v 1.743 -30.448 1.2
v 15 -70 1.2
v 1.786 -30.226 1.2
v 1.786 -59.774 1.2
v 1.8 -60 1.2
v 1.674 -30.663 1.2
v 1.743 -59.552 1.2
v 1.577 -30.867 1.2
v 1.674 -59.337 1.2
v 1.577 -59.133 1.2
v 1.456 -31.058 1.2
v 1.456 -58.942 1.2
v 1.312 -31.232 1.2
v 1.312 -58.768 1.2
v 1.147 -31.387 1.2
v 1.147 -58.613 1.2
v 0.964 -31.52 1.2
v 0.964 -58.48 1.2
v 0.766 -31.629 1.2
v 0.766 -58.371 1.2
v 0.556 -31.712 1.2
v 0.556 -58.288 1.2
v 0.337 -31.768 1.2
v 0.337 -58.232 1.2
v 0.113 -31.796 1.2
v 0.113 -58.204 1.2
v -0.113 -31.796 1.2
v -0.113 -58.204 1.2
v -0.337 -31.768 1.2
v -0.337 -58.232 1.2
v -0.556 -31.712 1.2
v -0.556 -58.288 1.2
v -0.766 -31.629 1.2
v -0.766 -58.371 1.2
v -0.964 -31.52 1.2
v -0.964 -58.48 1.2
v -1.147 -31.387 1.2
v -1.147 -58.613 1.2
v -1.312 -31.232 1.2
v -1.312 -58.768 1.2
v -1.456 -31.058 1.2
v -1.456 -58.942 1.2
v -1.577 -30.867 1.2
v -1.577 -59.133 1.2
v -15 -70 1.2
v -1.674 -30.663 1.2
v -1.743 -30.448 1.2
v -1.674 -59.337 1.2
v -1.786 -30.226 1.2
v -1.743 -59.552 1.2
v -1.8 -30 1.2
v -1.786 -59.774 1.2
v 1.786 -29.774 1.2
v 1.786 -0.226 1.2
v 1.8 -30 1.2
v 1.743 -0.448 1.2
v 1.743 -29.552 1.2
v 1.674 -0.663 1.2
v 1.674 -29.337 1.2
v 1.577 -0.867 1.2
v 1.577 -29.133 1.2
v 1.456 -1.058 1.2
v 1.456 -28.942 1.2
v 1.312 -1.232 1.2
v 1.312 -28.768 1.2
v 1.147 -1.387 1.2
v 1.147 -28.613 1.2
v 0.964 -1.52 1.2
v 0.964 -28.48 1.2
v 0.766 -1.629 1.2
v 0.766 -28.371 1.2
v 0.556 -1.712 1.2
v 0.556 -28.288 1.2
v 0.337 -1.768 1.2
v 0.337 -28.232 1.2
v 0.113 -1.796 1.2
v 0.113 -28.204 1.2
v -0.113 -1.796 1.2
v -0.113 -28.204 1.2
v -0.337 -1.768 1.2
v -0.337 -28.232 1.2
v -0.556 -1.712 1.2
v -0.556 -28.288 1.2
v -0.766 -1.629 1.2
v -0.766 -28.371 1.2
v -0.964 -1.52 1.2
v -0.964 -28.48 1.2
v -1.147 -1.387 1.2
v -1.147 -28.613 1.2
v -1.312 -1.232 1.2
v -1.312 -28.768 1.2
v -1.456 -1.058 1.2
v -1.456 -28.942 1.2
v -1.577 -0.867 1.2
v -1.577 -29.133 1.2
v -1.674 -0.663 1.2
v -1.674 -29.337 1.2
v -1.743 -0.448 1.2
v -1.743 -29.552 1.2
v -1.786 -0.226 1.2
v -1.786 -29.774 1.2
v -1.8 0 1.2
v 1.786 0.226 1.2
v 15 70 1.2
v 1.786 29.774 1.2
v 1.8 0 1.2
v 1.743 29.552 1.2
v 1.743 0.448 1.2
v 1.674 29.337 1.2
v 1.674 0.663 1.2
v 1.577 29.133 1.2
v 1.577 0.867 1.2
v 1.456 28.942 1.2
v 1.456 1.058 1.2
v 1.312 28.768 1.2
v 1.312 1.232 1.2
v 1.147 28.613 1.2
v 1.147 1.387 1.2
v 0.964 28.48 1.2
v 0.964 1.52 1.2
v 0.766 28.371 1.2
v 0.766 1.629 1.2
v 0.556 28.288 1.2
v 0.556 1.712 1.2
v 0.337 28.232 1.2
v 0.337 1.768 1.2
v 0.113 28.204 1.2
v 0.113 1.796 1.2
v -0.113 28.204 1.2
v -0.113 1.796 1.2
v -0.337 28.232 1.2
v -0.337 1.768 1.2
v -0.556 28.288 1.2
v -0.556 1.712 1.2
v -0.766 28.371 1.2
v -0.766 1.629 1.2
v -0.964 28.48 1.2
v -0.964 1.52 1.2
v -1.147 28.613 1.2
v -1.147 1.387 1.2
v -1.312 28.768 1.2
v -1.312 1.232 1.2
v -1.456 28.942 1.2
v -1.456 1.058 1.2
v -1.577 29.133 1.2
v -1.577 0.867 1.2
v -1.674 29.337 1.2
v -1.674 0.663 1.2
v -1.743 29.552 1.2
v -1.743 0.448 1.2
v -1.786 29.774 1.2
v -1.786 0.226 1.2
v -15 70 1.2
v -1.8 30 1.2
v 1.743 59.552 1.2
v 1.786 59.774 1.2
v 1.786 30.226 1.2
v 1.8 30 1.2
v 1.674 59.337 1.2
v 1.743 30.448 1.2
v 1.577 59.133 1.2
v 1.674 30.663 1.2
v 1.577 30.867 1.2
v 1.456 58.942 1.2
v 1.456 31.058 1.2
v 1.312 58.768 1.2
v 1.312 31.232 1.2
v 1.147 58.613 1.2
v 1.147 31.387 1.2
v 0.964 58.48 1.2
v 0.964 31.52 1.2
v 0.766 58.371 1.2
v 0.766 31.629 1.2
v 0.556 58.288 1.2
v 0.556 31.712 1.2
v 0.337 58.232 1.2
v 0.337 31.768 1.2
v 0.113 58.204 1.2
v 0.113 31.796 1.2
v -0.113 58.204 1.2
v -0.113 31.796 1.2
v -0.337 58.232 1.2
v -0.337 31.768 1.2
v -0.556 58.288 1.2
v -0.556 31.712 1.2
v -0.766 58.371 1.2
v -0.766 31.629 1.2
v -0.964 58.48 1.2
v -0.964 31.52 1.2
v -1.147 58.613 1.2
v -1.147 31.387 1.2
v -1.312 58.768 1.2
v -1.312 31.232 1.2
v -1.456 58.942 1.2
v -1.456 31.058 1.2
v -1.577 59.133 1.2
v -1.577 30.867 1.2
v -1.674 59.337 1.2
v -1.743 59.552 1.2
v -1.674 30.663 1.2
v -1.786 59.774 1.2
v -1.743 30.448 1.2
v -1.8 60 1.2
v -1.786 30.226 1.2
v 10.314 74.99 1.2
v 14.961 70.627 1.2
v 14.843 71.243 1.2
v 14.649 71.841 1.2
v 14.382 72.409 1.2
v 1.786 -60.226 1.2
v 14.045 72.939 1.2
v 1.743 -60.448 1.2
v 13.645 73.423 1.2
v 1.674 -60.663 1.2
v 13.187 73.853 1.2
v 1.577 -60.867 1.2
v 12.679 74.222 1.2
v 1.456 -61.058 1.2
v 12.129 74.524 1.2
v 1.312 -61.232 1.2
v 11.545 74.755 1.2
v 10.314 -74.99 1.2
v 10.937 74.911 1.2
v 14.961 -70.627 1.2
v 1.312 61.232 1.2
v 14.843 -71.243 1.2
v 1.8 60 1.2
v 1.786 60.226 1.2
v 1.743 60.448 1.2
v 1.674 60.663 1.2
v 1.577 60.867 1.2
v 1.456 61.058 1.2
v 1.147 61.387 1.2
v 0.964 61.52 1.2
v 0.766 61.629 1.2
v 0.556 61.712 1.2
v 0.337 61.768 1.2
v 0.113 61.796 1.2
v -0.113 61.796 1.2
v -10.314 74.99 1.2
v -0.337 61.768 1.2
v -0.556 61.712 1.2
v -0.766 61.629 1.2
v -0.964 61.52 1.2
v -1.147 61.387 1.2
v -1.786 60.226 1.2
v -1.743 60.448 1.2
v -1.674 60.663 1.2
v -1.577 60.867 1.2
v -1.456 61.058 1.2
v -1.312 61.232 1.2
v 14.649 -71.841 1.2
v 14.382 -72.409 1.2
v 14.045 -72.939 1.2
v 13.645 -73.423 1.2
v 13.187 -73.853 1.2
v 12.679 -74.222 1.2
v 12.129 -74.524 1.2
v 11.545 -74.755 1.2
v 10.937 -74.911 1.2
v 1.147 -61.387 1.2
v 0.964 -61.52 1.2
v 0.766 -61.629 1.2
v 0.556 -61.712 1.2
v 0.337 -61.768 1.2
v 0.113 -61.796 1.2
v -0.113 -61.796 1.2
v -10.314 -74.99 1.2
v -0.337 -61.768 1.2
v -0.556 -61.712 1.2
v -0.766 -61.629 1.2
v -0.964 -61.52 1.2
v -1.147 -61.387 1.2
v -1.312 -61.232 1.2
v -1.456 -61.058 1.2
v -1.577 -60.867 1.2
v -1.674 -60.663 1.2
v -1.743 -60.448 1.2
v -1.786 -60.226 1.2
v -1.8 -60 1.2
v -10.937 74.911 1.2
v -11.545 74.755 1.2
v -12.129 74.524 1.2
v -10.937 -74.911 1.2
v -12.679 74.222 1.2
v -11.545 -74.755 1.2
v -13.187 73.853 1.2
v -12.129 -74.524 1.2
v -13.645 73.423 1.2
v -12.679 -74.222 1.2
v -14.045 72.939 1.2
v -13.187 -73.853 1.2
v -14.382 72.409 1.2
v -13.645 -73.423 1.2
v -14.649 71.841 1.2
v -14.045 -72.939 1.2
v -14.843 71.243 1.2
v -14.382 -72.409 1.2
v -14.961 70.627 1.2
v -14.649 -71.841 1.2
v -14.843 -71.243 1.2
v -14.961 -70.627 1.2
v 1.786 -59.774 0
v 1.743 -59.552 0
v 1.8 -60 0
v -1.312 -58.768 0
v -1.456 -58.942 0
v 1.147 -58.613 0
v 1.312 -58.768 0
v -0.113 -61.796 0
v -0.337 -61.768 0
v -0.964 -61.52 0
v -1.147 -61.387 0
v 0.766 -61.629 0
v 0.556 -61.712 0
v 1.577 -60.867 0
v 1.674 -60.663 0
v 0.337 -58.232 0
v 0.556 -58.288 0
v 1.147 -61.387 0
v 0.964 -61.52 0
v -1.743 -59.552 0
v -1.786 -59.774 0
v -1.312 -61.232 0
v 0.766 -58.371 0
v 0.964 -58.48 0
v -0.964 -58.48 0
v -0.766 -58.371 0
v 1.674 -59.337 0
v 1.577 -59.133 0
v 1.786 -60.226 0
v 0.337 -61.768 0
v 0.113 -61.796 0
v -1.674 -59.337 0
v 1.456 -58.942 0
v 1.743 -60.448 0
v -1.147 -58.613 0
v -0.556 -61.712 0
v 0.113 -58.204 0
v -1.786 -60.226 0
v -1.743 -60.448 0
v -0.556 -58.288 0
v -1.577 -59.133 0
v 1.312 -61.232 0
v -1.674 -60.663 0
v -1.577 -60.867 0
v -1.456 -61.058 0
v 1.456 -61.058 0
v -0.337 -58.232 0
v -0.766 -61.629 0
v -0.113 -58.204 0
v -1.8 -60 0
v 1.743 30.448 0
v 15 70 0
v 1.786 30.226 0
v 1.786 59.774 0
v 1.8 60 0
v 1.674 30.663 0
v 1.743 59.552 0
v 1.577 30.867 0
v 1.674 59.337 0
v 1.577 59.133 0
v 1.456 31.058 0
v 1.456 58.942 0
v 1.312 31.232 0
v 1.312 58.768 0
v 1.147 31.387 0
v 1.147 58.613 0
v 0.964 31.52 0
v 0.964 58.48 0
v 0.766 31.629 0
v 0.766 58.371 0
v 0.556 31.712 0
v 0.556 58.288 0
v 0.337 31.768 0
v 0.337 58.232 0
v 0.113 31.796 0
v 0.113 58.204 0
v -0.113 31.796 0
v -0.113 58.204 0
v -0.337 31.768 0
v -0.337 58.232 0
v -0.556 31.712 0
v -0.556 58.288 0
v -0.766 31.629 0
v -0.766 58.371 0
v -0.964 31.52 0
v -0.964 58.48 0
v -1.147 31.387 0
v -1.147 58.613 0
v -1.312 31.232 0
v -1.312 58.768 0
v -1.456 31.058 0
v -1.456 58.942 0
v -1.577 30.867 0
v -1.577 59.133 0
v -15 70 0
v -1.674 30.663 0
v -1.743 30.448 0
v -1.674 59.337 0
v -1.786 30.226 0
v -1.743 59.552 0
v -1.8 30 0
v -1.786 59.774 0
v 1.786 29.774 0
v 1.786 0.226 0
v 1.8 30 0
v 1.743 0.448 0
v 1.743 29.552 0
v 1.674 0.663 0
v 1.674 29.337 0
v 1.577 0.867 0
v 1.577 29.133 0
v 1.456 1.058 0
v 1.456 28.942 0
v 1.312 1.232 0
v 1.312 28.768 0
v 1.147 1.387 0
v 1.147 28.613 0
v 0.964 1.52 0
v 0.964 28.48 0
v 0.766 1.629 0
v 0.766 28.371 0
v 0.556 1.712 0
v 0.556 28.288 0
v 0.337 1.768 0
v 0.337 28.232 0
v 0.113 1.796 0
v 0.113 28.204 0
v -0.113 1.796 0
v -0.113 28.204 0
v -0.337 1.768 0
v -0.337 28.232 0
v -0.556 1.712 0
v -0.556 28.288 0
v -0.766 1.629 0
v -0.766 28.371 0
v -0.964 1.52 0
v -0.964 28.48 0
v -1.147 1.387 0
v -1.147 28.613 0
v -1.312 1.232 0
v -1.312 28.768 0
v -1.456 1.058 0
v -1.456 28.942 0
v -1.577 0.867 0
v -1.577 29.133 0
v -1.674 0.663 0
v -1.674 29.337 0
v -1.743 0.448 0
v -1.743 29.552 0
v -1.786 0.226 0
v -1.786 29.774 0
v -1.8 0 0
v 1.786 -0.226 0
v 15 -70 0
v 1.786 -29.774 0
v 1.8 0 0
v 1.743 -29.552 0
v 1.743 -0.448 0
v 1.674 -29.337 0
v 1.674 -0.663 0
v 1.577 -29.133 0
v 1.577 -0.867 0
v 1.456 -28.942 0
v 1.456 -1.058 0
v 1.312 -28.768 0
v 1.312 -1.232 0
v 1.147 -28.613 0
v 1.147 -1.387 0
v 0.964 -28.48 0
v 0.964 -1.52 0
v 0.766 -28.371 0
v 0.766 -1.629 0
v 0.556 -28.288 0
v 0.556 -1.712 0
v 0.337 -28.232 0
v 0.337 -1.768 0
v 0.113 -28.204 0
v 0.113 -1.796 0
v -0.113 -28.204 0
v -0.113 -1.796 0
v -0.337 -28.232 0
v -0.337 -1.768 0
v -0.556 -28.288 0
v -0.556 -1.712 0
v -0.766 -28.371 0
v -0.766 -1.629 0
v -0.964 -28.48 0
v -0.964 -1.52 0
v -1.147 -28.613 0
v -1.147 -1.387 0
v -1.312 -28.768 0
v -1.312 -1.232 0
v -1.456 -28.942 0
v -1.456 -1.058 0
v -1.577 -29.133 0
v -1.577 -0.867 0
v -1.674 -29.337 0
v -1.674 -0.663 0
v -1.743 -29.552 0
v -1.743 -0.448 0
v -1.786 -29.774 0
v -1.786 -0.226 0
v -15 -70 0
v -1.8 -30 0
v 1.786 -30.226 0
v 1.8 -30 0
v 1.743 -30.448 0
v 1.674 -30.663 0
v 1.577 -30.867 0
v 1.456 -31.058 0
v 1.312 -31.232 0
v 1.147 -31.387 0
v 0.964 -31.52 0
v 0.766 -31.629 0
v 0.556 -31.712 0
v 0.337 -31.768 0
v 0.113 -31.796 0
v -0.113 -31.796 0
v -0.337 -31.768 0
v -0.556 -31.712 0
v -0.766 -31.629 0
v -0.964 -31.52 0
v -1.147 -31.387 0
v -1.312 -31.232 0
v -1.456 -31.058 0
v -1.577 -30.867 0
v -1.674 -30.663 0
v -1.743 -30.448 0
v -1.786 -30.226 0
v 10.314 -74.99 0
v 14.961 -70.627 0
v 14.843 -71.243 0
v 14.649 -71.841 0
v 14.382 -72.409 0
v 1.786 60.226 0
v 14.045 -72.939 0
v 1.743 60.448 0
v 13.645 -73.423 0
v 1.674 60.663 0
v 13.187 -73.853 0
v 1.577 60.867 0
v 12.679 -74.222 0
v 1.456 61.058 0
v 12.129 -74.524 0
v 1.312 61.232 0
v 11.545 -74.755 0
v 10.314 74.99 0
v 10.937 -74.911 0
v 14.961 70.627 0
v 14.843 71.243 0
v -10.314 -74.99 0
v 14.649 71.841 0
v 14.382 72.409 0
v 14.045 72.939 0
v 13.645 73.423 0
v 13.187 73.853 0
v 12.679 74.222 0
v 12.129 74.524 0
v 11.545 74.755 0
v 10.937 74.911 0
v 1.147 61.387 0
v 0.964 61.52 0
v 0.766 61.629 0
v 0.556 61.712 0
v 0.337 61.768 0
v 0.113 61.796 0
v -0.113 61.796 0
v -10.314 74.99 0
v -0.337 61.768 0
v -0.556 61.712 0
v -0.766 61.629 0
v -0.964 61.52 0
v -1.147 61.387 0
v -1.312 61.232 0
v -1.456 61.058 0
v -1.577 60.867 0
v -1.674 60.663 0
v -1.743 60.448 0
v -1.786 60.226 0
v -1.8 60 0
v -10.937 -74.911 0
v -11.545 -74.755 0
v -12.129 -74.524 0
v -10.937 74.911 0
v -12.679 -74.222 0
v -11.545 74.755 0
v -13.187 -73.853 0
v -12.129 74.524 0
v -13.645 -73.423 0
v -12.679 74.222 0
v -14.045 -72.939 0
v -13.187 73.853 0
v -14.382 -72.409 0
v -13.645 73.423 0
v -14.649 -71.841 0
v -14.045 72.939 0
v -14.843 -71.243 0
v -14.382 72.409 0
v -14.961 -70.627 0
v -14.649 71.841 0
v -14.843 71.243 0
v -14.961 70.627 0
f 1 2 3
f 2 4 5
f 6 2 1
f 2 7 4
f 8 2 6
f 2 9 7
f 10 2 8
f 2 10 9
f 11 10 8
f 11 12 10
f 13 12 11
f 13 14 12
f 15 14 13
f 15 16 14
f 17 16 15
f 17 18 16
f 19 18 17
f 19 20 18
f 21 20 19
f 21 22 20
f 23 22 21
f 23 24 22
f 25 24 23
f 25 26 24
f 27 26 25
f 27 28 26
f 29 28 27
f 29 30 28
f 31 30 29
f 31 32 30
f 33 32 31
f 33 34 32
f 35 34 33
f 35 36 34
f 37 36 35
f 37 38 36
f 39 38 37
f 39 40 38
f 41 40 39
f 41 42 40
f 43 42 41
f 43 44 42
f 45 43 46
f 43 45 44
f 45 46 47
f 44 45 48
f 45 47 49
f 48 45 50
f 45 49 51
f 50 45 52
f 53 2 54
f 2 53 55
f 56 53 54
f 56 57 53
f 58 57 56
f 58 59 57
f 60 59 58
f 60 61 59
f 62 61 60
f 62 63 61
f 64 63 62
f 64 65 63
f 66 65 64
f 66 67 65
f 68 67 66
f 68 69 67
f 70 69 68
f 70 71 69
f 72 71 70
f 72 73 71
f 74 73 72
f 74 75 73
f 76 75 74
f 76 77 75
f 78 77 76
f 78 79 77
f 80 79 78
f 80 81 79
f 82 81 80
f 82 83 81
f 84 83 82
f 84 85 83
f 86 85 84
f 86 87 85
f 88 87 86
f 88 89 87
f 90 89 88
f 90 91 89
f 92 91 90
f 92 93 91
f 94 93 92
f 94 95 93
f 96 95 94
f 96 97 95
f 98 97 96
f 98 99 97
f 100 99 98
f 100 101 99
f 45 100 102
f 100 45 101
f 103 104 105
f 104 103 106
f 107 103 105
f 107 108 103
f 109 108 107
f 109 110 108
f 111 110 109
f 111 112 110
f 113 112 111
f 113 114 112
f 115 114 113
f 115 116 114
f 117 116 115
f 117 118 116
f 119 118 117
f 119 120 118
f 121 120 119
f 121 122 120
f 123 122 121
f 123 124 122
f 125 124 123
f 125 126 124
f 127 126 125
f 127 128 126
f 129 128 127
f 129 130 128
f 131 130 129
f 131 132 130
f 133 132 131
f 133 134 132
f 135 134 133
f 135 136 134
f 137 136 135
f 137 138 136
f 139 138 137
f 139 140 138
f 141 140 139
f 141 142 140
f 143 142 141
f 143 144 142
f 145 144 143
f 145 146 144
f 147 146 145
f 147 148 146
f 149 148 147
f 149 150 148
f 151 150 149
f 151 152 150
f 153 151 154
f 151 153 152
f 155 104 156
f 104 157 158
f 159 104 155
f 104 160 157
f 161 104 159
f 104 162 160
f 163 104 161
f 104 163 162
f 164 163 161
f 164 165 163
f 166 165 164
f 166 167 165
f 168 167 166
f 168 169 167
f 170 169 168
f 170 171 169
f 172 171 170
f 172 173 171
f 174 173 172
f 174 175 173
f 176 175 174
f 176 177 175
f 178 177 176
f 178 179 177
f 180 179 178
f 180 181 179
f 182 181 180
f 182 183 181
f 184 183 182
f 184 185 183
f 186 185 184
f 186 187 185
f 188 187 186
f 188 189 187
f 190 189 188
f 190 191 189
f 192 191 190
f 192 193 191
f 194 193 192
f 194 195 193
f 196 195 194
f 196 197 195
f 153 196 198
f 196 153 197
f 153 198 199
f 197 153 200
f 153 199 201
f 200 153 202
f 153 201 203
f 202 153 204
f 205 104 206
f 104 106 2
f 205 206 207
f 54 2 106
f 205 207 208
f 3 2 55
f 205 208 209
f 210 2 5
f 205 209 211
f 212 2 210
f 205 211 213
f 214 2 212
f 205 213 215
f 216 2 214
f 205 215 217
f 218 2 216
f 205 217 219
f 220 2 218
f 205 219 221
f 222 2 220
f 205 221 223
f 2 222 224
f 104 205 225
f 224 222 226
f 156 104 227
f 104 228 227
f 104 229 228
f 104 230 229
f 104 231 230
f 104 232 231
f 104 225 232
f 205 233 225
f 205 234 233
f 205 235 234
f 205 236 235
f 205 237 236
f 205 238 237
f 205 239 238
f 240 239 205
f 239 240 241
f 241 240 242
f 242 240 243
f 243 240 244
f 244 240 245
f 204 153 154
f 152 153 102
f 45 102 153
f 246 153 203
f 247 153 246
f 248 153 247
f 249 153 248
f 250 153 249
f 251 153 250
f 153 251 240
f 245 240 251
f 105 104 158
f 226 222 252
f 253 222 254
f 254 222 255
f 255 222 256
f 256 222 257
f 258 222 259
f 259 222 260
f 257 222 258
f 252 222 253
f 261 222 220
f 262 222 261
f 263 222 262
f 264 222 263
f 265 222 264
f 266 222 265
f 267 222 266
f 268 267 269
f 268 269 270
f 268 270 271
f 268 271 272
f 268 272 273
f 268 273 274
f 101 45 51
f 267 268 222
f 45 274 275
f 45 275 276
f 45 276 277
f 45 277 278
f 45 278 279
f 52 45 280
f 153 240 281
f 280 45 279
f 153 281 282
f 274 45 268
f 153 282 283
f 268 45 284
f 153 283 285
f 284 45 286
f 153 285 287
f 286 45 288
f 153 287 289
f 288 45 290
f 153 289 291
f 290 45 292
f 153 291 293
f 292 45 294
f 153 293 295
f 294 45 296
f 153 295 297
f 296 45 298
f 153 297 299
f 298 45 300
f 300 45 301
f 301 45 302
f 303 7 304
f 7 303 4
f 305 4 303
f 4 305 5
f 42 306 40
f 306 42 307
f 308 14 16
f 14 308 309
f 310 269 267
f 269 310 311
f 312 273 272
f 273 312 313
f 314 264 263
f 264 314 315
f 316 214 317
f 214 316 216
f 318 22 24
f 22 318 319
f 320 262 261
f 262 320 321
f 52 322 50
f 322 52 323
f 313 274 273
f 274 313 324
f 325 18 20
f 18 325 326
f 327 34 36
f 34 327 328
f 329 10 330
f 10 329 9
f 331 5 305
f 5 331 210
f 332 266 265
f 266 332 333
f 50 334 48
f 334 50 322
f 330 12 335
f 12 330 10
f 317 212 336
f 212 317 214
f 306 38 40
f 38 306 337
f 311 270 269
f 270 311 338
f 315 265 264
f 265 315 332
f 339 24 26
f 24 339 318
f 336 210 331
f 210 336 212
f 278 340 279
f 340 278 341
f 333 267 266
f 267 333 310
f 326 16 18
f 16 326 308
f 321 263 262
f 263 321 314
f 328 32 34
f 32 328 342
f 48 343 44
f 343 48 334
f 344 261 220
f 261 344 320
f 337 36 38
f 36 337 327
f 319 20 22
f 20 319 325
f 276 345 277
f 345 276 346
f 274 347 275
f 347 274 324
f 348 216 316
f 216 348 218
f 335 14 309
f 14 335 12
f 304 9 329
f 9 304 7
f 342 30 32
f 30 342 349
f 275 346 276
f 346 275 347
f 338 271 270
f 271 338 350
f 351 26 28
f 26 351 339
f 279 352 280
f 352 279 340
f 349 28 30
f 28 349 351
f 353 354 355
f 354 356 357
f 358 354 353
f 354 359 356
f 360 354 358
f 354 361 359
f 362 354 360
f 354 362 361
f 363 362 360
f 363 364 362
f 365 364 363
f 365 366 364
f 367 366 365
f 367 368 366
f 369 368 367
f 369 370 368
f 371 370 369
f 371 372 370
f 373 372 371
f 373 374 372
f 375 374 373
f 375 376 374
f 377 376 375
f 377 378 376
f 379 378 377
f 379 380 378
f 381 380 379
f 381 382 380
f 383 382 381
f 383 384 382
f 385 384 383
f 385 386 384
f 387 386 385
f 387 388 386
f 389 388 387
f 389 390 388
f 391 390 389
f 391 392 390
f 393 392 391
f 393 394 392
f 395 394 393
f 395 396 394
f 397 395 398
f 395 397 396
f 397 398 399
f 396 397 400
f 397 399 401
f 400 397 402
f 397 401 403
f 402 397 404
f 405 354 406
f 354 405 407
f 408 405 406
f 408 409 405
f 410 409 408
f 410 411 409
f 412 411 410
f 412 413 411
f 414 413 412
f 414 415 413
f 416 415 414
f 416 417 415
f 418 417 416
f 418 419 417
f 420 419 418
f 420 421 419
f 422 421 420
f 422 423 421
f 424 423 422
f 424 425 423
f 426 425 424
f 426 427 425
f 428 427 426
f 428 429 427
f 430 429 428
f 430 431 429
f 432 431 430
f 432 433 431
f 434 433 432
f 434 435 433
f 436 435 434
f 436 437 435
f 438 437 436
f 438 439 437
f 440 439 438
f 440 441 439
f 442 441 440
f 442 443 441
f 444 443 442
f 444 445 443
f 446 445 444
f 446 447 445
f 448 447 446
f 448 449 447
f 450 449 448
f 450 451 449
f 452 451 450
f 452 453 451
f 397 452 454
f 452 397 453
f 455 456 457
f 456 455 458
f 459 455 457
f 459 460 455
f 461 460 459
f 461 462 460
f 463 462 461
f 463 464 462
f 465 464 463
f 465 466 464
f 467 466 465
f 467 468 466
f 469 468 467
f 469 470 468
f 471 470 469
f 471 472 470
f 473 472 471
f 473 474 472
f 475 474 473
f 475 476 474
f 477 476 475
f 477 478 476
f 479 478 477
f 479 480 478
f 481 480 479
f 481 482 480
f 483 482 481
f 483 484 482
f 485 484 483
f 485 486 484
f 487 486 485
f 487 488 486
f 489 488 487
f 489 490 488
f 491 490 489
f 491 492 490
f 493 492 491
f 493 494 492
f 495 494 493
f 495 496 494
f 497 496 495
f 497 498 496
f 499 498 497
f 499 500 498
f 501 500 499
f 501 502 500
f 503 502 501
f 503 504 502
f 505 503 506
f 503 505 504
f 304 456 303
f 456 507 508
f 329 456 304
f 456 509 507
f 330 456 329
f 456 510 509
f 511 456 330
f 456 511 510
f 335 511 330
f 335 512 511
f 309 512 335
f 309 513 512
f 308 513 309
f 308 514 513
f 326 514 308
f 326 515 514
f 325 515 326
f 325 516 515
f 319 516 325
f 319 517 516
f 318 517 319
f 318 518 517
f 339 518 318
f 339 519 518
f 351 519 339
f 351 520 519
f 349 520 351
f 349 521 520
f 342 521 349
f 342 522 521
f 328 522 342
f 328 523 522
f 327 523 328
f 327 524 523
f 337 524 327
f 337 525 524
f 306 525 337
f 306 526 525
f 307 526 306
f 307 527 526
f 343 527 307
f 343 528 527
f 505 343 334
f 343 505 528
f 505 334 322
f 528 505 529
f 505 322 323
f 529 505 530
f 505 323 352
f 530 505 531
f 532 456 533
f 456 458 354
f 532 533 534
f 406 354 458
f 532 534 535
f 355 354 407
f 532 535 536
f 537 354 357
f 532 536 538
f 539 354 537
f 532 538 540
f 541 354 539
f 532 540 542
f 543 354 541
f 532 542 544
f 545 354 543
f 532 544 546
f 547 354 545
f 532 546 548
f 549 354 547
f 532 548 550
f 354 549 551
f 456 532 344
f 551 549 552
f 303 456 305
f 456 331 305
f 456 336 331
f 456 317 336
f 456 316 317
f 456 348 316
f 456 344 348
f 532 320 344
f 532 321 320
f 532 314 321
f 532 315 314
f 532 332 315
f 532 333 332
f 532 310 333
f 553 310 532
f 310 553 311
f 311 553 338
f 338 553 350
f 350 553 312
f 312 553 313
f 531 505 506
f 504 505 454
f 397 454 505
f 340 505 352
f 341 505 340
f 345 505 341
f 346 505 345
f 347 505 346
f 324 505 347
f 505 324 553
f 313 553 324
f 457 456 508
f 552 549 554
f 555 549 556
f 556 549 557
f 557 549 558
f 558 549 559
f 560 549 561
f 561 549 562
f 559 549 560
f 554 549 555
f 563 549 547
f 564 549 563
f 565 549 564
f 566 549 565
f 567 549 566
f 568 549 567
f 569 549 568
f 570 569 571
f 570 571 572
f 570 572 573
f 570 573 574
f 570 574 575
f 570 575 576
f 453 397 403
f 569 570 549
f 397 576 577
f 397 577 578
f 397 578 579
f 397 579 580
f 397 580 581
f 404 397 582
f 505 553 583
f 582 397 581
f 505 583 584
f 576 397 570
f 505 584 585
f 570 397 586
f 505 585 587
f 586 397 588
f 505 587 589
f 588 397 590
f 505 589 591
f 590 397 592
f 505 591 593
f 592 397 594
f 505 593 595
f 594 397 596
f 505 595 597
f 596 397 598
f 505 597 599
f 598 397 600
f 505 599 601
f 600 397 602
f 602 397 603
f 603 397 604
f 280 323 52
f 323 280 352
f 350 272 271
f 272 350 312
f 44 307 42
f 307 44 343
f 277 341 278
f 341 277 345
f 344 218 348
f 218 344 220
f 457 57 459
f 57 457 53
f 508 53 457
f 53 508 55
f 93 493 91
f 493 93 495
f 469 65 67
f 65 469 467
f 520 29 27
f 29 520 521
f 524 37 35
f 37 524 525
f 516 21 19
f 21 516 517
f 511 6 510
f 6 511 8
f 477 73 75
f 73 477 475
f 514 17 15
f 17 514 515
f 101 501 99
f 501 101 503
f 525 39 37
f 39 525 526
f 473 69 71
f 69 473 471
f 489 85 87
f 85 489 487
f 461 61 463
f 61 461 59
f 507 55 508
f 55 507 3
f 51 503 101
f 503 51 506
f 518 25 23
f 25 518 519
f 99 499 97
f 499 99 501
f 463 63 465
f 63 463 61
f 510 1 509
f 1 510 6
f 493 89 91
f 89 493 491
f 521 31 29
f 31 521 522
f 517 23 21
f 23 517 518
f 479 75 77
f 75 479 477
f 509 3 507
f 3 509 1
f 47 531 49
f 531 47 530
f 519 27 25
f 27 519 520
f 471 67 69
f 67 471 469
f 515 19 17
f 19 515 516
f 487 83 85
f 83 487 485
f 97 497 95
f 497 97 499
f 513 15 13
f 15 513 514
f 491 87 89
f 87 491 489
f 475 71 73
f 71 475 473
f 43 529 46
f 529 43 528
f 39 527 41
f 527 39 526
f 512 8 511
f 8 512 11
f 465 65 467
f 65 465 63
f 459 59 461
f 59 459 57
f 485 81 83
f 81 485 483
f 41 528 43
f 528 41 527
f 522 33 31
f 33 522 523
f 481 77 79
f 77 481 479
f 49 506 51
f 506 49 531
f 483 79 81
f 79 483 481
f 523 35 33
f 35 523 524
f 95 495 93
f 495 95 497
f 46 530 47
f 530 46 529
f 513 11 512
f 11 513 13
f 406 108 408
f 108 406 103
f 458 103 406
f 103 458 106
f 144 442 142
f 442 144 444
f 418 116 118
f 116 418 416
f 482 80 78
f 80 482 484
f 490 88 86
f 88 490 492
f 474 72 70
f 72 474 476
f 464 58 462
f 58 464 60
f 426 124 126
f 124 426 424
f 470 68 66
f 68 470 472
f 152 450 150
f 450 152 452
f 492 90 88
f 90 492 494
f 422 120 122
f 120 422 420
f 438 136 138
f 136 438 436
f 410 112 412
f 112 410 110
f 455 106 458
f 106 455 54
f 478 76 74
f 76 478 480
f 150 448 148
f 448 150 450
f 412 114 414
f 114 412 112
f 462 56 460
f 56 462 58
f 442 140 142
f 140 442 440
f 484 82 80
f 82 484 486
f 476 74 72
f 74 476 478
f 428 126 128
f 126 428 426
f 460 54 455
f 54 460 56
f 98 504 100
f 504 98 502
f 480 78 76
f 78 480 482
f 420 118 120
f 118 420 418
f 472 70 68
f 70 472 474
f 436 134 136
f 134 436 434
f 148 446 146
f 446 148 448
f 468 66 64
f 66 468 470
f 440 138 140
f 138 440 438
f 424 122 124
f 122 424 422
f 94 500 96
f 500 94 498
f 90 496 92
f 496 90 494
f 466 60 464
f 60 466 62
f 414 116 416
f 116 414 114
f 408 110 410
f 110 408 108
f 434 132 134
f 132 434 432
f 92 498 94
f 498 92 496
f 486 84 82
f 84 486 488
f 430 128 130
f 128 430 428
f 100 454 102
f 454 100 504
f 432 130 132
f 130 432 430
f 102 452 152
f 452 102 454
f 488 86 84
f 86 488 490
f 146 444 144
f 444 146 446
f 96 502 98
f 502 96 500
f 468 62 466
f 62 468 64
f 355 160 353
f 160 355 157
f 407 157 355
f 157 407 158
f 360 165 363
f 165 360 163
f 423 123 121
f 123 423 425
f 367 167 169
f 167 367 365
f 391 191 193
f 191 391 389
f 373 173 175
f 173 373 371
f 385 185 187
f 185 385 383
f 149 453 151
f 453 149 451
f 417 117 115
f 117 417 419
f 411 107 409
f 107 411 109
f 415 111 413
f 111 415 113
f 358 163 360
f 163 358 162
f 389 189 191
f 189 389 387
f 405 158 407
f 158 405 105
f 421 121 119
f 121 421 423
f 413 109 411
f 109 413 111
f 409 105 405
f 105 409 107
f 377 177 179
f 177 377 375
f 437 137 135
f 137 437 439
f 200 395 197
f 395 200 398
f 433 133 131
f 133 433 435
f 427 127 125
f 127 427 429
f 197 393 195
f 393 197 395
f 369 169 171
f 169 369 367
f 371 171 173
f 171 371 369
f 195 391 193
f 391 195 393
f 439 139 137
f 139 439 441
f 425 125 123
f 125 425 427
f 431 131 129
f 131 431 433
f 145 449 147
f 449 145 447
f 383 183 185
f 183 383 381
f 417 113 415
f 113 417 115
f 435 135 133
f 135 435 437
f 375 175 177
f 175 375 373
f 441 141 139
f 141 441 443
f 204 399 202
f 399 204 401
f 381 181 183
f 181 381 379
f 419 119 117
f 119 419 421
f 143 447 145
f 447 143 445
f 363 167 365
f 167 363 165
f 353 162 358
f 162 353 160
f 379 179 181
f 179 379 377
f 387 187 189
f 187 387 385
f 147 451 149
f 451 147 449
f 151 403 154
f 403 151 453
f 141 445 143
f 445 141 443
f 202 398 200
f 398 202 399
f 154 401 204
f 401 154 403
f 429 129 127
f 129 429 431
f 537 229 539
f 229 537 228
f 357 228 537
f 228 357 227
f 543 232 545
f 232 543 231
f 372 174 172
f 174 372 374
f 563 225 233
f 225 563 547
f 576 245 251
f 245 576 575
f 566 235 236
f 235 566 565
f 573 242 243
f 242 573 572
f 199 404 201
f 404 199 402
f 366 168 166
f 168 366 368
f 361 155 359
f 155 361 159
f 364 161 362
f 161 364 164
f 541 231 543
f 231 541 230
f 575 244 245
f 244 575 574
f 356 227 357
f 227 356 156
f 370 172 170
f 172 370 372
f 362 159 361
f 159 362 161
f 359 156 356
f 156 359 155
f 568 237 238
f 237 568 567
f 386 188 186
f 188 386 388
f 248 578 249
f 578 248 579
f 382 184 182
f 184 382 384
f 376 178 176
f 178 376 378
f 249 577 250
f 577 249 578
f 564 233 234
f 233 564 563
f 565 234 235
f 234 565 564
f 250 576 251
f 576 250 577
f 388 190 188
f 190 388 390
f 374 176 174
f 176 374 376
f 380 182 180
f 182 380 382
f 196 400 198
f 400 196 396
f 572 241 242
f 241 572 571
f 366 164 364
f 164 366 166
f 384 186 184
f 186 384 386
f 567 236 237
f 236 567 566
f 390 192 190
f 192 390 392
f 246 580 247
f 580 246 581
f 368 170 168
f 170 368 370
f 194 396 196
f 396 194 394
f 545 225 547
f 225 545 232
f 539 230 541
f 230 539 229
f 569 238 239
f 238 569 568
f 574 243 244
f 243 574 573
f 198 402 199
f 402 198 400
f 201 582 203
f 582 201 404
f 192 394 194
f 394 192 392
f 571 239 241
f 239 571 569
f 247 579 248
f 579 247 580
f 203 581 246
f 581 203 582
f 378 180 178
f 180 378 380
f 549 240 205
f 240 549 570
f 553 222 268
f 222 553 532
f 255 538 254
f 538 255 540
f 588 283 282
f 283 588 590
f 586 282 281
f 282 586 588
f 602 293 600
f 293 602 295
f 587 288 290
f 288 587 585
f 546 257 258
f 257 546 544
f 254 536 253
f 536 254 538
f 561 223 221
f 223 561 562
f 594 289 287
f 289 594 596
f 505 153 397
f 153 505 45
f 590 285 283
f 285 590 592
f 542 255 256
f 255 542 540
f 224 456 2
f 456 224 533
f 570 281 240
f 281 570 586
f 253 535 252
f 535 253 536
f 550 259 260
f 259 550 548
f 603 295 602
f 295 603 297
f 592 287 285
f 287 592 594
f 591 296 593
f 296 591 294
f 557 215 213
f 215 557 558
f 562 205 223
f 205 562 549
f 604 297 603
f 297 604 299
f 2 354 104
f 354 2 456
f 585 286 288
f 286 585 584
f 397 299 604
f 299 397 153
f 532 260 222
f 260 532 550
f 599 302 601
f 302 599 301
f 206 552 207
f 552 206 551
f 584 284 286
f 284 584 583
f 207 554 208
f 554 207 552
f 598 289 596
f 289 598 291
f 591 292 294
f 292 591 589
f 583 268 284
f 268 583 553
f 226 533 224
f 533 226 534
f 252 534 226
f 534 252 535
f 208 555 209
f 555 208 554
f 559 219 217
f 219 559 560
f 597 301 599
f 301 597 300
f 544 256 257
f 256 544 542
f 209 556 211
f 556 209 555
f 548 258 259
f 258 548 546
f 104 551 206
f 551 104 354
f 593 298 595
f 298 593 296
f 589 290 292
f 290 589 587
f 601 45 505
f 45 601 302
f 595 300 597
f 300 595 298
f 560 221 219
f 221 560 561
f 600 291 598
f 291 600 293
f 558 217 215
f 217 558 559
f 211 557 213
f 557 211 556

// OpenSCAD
$fn = 50;


difference() {
	union() {
		hull() {
			translate(v = [-10.0000000000, 70.0000000000, 0]) {
				cylinder(h = 27, r = 5);
			}
			translate(v = [10.0000000000, 70.0000000000, 0]) {
				cylinder(h = 27, r = 5);
			}
			translate(v = [-10.0000000000, -70.0000000000, 0]) {
				cylinder(h = 27, r = 5);
			}
			translate(v = [10.0000000000, -70.0000000000, 0]) {
				cylinder(h = 27, r = 5);
			}
		}
	}
	union() {
		translate(v = [0, 0, 1.2000000000]) {
			hull() {
				translate(v = [-10.0000000000, 70.0000000000, 0]) {
					cylinder(h = 25.8000000000, r = 3.8000000000);
				}
				translate(v = [10.0000000000, 70.0000000000, 0]) {
					cylinder(h = 25.8000000000, r = 3.8000000000);
				}
				translate(v = [-10.0000000000, -70.0000000000, 0]) {
					cylinder(h = 25.8000000000, r = 3.8000000000);
				}
				translate(v = [10.0000000000, -70.0000000000, 0]) {
					cylinder(h = 25.8000000000, r = 3.8000000000);
				}
			}
		}
		#translate(v = [0.0000000000, -60.0000000000, 0]) {
			cylinder(h = 1.2000000000, r = 1.8000000000);
		}
		#translate(v = [0.0000000000, -30.0000000000, 0]) {
			cylinder(h = 1.2000000000, r = 1.8000000000);
		}
		#cylinder(h = 1.2000000000, r = 1.8000000000);
		#translate(v = [0.0000000000, 30.0000000000, 0]) {
			cylinder(h = 1.2000000000, r = 1.8000000000);
		}
		#translate(v = [0.0000000000, 60.0000000000, 0]) {
			cylinder(h = 1.2000000000, r = 1.8000000000);
		}
		translate(v = [-250.0000000000, -250.0000000000, 1.2000000000]) {
			cube(size = [500, 500, 500]);
		}
		translate(v = [-250.0000000000, -250.0000000000, 1.2000000000]) {
			cube(size = [500, 500, 500]);
		}
		translate(v = [-250.0000000000, -250.0000000000, 1.2000000000]) {
			cube(size = [500, 500, 500]);
		}
	}
}
